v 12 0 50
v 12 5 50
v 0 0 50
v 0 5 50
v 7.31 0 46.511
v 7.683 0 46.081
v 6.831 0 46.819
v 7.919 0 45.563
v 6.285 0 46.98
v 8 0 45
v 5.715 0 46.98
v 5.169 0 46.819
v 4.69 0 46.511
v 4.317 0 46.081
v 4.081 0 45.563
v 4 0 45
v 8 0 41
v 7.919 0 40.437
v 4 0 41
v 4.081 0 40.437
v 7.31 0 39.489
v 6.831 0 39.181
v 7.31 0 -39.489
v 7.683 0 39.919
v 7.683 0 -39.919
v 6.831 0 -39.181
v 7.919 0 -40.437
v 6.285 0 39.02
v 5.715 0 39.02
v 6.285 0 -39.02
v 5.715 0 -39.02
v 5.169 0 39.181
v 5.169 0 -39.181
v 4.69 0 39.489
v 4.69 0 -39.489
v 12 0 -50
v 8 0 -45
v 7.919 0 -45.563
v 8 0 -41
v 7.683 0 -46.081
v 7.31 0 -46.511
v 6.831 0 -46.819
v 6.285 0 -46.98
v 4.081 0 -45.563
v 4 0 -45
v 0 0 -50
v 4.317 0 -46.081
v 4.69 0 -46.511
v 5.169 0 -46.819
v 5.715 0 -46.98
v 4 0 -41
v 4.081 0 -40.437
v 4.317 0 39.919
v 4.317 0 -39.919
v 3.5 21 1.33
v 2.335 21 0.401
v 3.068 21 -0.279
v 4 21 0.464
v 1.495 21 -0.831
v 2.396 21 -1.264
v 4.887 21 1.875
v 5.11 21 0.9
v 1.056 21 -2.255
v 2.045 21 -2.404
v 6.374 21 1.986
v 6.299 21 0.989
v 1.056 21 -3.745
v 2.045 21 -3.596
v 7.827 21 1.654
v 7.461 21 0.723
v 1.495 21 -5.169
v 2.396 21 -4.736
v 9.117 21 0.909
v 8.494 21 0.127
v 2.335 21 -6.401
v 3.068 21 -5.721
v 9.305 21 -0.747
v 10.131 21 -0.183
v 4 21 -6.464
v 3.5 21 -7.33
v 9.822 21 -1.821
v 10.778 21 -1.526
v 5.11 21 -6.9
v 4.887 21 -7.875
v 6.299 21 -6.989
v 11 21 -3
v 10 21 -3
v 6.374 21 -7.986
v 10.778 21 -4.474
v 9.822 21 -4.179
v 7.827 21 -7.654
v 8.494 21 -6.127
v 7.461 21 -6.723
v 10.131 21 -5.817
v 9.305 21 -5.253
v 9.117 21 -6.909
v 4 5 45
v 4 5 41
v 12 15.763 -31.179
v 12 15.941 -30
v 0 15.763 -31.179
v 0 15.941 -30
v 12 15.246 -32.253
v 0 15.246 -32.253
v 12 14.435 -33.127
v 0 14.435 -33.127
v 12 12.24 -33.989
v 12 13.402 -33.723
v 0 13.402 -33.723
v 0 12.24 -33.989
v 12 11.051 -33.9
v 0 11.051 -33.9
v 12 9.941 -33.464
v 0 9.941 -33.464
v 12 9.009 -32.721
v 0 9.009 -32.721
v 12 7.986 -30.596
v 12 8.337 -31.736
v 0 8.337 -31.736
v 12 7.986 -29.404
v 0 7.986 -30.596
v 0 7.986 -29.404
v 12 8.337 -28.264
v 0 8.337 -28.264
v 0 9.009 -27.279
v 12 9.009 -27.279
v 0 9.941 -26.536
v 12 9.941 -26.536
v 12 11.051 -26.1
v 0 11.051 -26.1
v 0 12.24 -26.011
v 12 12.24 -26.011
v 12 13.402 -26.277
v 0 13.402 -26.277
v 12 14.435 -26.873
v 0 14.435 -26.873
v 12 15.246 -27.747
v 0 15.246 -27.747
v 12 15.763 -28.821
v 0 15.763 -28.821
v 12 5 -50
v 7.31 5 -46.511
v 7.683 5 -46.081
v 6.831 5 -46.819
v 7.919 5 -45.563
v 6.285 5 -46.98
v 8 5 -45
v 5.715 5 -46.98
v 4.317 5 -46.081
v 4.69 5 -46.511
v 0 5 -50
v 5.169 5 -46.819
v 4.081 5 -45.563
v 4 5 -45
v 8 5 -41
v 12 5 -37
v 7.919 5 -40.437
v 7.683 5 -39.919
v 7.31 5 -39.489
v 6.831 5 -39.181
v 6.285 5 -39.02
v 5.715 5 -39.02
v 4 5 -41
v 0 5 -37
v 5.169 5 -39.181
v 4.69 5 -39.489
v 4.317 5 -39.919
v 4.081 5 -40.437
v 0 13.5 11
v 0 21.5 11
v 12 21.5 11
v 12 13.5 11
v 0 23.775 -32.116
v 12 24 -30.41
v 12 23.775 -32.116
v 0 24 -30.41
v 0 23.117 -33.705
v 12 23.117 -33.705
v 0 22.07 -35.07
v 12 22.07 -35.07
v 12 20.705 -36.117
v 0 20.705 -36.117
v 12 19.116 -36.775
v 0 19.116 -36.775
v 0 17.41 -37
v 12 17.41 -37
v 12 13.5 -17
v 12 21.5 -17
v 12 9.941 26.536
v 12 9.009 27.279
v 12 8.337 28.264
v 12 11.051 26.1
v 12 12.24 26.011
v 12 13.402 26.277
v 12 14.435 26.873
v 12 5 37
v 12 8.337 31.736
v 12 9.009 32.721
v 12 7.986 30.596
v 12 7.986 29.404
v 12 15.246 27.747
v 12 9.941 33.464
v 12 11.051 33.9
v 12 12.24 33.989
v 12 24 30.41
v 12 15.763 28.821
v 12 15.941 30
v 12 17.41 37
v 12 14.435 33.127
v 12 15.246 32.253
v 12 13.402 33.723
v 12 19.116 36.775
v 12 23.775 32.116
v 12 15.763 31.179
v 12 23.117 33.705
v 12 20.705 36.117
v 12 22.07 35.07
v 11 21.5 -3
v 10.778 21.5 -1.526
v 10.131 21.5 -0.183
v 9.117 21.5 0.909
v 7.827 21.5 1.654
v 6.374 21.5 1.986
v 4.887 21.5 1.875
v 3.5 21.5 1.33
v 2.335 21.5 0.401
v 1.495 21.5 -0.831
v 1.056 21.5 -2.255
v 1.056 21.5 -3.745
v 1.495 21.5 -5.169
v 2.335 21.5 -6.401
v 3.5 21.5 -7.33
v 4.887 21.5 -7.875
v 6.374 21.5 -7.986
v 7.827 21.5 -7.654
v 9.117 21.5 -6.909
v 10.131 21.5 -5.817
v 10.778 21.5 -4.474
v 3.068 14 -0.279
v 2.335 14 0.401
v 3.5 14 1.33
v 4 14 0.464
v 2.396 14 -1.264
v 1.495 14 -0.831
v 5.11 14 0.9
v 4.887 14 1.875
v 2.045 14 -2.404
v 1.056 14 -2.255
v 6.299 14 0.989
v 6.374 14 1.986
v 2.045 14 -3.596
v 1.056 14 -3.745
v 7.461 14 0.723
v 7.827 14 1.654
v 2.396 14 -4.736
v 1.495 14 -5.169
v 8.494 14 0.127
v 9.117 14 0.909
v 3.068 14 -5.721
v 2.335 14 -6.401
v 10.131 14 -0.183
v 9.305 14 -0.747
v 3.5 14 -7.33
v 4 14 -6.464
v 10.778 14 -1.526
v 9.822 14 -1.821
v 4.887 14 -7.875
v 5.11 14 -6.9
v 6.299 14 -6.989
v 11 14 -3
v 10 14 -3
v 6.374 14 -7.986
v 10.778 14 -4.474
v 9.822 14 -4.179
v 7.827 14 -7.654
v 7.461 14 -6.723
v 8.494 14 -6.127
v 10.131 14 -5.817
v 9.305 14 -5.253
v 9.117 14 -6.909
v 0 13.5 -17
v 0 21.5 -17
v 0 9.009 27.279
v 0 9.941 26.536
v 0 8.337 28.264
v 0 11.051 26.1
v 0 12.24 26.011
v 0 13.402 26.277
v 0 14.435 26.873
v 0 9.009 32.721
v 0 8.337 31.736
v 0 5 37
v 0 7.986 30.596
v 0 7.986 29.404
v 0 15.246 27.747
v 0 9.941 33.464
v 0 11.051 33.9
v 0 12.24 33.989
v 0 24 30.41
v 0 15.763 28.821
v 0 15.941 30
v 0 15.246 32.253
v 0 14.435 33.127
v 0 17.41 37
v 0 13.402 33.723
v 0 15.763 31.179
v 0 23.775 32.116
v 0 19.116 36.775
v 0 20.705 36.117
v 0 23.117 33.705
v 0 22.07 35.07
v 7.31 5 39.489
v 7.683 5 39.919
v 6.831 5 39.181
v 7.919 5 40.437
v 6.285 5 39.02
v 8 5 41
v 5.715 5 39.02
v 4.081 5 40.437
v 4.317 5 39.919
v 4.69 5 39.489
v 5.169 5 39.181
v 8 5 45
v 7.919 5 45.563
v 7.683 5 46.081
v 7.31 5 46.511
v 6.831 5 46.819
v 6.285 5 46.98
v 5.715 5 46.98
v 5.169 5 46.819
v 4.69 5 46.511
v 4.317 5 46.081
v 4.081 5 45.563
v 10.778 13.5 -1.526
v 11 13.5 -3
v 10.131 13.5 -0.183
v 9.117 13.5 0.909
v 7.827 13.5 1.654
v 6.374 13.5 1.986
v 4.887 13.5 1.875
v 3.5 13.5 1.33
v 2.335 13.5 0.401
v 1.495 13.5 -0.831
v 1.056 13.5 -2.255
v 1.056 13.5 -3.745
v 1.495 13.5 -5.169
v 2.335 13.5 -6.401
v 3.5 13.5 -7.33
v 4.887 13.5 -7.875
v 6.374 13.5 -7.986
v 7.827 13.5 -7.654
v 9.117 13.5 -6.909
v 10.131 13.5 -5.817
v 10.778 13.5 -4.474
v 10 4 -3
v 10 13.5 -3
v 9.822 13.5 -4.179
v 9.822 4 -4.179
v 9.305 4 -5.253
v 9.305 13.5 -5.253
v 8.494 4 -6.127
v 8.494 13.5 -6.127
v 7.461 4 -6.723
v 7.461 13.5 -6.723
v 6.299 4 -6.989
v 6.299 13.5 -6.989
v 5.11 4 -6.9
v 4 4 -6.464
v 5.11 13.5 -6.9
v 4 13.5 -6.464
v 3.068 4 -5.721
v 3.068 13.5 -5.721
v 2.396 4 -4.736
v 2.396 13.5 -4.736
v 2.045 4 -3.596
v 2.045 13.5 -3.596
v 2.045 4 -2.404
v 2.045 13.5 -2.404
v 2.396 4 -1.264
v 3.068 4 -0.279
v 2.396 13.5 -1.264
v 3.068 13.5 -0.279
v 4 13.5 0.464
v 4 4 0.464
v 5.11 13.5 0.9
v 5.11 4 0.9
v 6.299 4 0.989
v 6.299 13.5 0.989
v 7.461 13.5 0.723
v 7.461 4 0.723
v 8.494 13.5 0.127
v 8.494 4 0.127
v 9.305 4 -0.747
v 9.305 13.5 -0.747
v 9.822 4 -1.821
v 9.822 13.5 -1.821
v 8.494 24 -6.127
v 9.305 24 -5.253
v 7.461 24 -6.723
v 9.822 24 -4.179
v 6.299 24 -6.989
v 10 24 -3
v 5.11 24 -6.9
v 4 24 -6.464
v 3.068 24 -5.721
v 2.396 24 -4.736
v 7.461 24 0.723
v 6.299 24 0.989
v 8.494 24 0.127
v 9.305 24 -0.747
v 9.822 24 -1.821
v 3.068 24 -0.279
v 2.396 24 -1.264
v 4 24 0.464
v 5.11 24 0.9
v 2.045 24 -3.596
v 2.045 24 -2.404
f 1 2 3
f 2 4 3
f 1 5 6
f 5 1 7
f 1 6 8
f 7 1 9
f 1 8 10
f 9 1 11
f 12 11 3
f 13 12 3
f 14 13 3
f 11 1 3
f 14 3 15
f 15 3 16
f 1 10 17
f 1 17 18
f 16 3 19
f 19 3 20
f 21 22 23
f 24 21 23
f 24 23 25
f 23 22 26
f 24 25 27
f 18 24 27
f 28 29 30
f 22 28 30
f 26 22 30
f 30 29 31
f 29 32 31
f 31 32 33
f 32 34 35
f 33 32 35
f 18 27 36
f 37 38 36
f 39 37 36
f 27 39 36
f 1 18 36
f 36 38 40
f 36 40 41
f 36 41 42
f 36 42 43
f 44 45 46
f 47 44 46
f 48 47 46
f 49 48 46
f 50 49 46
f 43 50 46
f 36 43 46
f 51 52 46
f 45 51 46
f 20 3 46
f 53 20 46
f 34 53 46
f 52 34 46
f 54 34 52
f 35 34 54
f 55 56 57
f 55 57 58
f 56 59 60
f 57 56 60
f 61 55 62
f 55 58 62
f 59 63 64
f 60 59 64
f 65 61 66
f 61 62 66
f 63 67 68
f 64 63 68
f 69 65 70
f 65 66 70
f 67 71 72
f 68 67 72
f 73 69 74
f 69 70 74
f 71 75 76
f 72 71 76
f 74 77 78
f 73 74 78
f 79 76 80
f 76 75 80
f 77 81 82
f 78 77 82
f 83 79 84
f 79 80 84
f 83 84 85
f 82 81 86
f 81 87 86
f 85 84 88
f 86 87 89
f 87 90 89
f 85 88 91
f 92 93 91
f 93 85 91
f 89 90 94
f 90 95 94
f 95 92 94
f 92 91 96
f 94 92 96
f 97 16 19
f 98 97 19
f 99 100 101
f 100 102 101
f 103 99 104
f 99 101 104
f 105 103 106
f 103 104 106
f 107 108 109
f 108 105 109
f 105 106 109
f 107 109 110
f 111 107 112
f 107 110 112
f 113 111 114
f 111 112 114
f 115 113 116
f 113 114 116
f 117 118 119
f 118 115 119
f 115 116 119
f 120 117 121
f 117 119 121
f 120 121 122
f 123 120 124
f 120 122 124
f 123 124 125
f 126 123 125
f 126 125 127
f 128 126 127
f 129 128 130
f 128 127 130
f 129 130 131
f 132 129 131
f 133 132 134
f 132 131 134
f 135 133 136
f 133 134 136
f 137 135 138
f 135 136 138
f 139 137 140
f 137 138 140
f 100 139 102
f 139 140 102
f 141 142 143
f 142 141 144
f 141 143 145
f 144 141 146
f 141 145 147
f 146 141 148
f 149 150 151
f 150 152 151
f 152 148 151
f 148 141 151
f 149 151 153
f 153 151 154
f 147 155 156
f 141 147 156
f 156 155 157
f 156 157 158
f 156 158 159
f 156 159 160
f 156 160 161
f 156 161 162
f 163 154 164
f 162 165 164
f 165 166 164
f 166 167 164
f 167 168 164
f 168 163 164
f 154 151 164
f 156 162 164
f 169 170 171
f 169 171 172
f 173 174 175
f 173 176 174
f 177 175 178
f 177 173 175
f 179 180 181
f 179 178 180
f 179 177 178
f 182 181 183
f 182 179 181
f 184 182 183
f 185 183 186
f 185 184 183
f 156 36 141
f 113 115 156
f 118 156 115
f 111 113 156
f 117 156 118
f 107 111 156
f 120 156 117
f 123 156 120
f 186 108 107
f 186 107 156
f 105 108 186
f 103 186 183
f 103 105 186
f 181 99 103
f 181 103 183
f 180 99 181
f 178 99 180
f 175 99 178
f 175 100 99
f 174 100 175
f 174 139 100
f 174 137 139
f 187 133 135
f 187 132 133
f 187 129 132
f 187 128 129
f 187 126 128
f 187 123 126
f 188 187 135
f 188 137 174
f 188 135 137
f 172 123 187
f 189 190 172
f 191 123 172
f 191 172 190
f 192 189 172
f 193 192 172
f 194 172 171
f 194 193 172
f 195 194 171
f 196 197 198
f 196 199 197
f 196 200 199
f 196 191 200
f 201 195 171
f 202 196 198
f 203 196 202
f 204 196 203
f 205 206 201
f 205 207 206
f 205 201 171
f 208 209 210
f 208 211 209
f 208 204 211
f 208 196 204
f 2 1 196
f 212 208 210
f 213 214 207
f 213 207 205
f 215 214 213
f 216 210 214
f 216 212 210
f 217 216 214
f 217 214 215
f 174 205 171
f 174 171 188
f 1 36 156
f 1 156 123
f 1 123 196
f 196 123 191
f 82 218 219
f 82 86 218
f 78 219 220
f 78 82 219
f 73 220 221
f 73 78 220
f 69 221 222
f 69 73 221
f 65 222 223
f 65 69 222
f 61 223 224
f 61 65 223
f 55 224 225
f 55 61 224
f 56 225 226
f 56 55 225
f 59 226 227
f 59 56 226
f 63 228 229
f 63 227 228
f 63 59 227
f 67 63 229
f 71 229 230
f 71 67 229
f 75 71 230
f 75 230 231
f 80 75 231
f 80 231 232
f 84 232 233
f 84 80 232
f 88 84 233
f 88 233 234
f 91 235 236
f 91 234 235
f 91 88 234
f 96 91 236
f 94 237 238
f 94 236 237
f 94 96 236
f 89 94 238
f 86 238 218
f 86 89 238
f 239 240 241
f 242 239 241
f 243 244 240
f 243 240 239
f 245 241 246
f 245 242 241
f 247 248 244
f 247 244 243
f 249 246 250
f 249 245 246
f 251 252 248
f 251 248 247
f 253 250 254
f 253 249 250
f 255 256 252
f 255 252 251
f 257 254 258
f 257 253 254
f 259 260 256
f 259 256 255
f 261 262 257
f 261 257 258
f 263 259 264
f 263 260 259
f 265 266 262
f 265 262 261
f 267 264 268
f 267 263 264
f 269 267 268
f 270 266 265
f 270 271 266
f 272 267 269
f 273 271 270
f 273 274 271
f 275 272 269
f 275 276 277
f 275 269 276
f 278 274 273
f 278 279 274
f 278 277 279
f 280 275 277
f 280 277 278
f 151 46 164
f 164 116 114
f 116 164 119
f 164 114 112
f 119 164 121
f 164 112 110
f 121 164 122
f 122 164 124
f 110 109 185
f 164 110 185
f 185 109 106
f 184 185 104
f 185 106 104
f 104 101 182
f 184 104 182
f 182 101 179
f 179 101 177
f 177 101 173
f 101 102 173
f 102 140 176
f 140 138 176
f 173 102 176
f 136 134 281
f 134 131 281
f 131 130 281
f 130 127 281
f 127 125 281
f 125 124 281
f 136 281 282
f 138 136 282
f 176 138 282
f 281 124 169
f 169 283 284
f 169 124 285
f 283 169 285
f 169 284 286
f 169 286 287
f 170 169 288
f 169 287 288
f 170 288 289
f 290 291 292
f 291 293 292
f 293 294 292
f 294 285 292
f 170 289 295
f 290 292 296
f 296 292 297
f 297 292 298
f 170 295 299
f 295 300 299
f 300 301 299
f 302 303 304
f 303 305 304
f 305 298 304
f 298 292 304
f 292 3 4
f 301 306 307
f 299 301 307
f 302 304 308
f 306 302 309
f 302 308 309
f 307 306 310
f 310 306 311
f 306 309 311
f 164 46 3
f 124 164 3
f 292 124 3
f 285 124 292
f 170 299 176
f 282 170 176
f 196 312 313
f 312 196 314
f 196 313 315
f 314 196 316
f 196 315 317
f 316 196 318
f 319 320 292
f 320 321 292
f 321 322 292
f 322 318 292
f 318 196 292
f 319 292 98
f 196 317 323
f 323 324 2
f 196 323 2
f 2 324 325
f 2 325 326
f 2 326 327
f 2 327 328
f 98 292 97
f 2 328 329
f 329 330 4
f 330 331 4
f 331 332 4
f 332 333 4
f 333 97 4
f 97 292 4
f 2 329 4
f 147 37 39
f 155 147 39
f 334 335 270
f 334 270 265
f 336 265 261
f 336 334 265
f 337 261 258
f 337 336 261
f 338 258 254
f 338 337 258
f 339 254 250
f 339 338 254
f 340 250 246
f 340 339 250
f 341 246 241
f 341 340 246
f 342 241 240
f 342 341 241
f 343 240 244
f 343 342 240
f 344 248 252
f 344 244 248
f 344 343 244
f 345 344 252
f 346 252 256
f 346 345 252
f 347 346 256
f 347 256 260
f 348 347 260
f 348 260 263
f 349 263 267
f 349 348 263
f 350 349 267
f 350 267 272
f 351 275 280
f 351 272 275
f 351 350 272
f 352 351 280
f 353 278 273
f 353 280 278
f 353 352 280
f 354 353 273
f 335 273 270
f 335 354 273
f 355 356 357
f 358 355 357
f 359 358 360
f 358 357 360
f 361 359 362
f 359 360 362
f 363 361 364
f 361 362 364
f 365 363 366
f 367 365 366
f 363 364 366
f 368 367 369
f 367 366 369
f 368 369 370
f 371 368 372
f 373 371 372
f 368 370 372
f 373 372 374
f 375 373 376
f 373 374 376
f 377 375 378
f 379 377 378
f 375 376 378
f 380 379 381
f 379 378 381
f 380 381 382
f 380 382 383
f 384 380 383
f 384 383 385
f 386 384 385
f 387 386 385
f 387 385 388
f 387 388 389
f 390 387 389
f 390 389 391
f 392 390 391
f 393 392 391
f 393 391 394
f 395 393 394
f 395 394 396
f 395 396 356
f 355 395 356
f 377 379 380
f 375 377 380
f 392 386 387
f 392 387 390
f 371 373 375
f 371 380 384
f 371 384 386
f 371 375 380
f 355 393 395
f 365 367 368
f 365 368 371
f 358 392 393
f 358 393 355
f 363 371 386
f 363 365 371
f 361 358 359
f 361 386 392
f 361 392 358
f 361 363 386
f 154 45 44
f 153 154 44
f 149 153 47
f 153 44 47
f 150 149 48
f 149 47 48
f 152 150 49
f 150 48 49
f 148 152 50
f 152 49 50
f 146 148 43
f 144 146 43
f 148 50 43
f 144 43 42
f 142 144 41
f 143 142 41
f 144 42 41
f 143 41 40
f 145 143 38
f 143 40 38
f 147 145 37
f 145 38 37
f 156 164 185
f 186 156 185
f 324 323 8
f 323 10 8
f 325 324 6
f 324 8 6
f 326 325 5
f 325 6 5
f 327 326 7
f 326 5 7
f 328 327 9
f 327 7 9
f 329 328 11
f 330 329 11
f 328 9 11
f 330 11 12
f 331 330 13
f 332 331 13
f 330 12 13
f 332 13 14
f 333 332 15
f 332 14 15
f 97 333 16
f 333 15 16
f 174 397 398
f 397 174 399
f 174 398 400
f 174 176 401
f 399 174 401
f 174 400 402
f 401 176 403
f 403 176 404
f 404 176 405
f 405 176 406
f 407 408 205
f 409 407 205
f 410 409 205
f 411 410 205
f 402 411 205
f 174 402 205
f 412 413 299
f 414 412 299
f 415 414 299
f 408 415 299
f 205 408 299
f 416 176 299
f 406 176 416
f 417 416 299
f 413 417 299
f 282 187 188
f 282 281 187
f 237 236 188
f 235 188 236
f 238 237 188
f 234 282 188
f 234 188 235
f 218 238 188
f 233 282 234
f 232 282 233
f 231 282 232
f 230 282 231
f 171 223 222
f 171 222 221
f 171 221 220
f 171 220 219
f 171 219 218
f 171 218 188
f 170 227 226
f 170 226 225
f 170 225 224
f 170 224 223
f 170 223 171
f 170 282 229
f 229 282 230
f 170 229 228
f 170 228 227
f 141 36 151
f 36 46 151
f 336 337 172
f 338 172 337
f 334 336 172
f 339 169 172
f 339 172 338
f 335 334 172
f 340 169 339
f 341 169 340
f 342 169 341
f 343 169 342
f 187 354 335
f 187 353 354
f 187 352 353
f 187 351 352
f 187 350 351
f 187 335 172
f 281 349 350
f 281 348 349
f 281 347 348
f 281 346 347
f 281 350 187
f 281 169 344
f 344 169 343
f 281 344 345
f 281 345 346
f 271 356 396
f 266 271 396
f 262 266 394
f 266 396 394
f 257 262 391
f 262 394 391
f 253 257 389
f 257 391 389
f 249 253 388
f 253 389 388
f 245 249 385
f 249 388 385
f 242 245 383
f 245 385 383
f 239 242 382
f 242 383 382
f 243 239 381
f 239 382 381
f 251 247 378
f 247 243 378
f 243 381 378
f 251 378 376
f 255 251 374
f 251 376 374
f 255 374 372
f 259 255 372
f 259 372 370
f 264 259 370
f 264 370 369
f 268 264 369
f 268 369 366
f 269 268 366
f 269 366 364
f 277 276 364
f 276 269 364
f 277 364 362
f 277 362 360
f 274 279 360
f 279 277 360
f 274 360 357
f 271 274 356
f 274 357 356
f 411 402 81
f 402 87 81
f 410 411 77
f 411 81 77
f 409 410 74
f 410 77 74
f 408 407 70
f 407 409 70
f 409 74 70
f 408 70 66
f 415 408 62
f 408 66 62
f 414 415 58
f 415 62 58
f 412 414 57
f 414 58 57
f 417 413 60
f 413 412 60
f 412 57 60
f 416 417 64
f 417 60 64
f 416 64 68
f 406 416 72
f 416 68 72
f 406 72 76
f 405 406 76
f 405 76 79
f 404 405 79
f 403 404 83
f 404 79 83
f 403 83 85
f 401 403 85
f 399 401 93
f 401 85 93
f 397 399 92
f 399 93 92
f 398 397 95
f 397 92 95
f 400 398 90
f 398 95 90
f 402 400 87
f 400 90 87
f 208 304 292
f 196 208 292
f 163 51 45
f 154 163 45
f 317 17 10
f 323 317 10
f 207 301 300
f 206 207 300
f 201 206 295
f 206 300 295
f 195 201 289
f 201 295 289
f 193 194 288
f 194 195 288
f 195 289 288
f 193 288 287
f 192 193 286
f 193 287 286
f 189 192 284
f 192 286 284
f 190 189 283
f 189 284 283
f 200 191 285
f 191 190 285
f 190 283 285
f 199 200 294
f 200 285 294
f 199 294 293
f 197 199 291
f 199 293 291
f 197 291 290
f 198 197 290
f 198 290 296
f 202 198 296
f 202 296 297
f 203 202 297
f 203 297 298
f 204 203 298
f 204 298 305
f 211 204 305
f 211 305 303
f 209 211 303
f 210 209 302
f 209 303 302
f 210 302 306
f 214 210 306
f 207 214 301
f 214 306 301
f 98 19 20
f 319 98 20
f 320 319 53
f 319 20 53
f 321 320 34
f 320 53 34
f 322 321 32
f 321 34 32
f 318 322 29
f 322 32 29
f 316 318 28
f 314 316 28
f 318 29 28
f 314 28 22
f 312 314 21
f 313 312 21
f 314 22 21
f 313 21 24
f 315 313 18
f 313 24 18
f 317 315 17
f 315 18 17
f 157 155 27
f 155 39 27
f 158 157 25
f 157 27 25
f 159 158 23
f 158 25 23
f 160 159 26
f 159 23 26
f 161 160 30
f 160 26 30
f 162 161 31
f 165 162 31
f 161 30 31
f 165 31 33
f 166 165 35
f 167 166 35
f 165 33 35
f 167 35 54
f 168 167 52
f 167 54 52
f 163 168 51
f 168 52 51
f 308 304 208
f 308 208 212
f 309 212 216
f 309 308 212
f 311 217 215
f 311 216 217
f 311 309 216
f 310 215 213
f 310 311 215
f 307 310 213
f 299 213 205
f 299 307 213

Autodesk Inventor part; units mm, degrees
ref_plane "YZ Plane" through (0, 0, 0) normal (1, 0, 0) x (0, 1, 0)
ref_plane "XZ Plane" through (0, 0, 0) normal (0, 1, 0) x (-1, 0, 0)
ref_plane "XY Plane" through (0, 0, 0) normal (0, 0, 1) x (1, 0, 0)
sketch "Sketch1" plane through (0, 0, 0) normal (1, 0, 0) x (0, 1, 0)
  line L0 (0, 50) -> (0, -50)
  line L1 (0, -50) -> (5, -50)
  line L2 (5, -50) -> (5, -37)
  line L3 (5, -37) -> (17.41, -37)
  line L4 (24, -30.41) -> (24, 30.41)
  line L5 (17.41, 37) -> (5, 37)
  line L6 (5, 37) -> (5, 50)
  line L7 (5, 50) -> (0, 50)
  line L8 (21.5, 11) -> (13.5, 11)
  line L9 (13.5, 11) -> (13.5, -17)
  line L10 (13.5, -17) -> (21.5, -17)
  line L11 (21.5, -17) -> (21.5, 11)
  circle A0 centre (11.9411, 30) radius 4
  circle A1 centre (11.9411, -30) radius 4
  arc A2 (24, 30.41) -> (17.41, 37) centre (17.41, 30.41) ccw
  arc A3 (17.41, -37) -> (24, -30.41) centre (17.41, -30.41) ccw
  point P0 (0, 0)
  point P1 (24, -37)
  point P2 (0, 0)
  dimension "d0" = 100
  dimension "d1" = 5
  dimension "d2" = 13
  dimension "d3" = 13
  dimension "d4" = 19
  dimension "d5" = 28
  dimension "d6" = 26
  dimension "d7" = 8
  dimension "d8" = 2.5
  dimension "d9" = 8
  dimension "d10" = 60
  dimension "d11" = 30
  dimension "d12" = 6.59
extrude "Extrusion1" add sketch "Sketch1" along normal blind 12
sketch "Sketch2" plane through (0, 24, 30.41) normal (0, 1, 0) x (1, 0, 0)
  circle A0 centre (6, 33.41) radius 4
  line L0 (0, -6.59) -> (12, -6.59) projected
  point P0 (0, 30.41)
  point P1 (6, -6.59)
  dimension "d15" = 40
  dimension "d16" = 8
extrude "Extrusion2" cut sketch "Sketch2" against normal blind 20
sketch "Sketch3" plane through (0, 0, -50) normal (0, -1, 0) x (1, 0, 0)
  line L0 (4, 95) -> (4, 91)
  line L1 (8, 91) -> (8, 95)
  arc A0 (4, 91) -> (8, 91) centre (6, 91) ccw
  arc A1 (8, 95) -> (4, 95) centre (6, 95) ccw
  line L2 (0, 100) -> (12, 100) projected
  line L3 (0, 100) -> (0, 0) projected
  line L4 (4, 9) -> (4, 5)
  line L5 (8, 5) -> (8, 9)
  arc A2 (4, 5) -> (8, 5) centre (6, 5) ccw
  arc A3 (8, 9) -> (4, 9) centre (6, 9) ccw
  line L6 (0, 0) -> (12, 0) projected
  point P0 (0, 50)
  dimension "d19" = 4
  dimension "d20" = 4
  dimension "d21" = 5
  dimension "d22" = 6
  dimension "d23" = 4
  dimension "d24" = 4
  dimension "d25" = 5
extrude "Extrusion3" cut sketch "Sketch3" against normal up to next
sketch "Sketch5" plane through (0, 13.5, 11) normal (0, 1, 0) x (1, 0, 0)
  circle A0 centre (6, 14) radius 4 projected
  circle A1 centre (6, 14) radius 5
  point P0 (0, 11)
  dimension "d28" = 10
extrude "Extrusion4" add sketch "Sketch5" along normal blind 0.5
pattern_linear "Rectangular Pattern1" count 2 spacing 7.5 along (0, 1, 0) of "Extrusion4"
equation "\"d3\" = d2"
properties material "ABS Plastic"
